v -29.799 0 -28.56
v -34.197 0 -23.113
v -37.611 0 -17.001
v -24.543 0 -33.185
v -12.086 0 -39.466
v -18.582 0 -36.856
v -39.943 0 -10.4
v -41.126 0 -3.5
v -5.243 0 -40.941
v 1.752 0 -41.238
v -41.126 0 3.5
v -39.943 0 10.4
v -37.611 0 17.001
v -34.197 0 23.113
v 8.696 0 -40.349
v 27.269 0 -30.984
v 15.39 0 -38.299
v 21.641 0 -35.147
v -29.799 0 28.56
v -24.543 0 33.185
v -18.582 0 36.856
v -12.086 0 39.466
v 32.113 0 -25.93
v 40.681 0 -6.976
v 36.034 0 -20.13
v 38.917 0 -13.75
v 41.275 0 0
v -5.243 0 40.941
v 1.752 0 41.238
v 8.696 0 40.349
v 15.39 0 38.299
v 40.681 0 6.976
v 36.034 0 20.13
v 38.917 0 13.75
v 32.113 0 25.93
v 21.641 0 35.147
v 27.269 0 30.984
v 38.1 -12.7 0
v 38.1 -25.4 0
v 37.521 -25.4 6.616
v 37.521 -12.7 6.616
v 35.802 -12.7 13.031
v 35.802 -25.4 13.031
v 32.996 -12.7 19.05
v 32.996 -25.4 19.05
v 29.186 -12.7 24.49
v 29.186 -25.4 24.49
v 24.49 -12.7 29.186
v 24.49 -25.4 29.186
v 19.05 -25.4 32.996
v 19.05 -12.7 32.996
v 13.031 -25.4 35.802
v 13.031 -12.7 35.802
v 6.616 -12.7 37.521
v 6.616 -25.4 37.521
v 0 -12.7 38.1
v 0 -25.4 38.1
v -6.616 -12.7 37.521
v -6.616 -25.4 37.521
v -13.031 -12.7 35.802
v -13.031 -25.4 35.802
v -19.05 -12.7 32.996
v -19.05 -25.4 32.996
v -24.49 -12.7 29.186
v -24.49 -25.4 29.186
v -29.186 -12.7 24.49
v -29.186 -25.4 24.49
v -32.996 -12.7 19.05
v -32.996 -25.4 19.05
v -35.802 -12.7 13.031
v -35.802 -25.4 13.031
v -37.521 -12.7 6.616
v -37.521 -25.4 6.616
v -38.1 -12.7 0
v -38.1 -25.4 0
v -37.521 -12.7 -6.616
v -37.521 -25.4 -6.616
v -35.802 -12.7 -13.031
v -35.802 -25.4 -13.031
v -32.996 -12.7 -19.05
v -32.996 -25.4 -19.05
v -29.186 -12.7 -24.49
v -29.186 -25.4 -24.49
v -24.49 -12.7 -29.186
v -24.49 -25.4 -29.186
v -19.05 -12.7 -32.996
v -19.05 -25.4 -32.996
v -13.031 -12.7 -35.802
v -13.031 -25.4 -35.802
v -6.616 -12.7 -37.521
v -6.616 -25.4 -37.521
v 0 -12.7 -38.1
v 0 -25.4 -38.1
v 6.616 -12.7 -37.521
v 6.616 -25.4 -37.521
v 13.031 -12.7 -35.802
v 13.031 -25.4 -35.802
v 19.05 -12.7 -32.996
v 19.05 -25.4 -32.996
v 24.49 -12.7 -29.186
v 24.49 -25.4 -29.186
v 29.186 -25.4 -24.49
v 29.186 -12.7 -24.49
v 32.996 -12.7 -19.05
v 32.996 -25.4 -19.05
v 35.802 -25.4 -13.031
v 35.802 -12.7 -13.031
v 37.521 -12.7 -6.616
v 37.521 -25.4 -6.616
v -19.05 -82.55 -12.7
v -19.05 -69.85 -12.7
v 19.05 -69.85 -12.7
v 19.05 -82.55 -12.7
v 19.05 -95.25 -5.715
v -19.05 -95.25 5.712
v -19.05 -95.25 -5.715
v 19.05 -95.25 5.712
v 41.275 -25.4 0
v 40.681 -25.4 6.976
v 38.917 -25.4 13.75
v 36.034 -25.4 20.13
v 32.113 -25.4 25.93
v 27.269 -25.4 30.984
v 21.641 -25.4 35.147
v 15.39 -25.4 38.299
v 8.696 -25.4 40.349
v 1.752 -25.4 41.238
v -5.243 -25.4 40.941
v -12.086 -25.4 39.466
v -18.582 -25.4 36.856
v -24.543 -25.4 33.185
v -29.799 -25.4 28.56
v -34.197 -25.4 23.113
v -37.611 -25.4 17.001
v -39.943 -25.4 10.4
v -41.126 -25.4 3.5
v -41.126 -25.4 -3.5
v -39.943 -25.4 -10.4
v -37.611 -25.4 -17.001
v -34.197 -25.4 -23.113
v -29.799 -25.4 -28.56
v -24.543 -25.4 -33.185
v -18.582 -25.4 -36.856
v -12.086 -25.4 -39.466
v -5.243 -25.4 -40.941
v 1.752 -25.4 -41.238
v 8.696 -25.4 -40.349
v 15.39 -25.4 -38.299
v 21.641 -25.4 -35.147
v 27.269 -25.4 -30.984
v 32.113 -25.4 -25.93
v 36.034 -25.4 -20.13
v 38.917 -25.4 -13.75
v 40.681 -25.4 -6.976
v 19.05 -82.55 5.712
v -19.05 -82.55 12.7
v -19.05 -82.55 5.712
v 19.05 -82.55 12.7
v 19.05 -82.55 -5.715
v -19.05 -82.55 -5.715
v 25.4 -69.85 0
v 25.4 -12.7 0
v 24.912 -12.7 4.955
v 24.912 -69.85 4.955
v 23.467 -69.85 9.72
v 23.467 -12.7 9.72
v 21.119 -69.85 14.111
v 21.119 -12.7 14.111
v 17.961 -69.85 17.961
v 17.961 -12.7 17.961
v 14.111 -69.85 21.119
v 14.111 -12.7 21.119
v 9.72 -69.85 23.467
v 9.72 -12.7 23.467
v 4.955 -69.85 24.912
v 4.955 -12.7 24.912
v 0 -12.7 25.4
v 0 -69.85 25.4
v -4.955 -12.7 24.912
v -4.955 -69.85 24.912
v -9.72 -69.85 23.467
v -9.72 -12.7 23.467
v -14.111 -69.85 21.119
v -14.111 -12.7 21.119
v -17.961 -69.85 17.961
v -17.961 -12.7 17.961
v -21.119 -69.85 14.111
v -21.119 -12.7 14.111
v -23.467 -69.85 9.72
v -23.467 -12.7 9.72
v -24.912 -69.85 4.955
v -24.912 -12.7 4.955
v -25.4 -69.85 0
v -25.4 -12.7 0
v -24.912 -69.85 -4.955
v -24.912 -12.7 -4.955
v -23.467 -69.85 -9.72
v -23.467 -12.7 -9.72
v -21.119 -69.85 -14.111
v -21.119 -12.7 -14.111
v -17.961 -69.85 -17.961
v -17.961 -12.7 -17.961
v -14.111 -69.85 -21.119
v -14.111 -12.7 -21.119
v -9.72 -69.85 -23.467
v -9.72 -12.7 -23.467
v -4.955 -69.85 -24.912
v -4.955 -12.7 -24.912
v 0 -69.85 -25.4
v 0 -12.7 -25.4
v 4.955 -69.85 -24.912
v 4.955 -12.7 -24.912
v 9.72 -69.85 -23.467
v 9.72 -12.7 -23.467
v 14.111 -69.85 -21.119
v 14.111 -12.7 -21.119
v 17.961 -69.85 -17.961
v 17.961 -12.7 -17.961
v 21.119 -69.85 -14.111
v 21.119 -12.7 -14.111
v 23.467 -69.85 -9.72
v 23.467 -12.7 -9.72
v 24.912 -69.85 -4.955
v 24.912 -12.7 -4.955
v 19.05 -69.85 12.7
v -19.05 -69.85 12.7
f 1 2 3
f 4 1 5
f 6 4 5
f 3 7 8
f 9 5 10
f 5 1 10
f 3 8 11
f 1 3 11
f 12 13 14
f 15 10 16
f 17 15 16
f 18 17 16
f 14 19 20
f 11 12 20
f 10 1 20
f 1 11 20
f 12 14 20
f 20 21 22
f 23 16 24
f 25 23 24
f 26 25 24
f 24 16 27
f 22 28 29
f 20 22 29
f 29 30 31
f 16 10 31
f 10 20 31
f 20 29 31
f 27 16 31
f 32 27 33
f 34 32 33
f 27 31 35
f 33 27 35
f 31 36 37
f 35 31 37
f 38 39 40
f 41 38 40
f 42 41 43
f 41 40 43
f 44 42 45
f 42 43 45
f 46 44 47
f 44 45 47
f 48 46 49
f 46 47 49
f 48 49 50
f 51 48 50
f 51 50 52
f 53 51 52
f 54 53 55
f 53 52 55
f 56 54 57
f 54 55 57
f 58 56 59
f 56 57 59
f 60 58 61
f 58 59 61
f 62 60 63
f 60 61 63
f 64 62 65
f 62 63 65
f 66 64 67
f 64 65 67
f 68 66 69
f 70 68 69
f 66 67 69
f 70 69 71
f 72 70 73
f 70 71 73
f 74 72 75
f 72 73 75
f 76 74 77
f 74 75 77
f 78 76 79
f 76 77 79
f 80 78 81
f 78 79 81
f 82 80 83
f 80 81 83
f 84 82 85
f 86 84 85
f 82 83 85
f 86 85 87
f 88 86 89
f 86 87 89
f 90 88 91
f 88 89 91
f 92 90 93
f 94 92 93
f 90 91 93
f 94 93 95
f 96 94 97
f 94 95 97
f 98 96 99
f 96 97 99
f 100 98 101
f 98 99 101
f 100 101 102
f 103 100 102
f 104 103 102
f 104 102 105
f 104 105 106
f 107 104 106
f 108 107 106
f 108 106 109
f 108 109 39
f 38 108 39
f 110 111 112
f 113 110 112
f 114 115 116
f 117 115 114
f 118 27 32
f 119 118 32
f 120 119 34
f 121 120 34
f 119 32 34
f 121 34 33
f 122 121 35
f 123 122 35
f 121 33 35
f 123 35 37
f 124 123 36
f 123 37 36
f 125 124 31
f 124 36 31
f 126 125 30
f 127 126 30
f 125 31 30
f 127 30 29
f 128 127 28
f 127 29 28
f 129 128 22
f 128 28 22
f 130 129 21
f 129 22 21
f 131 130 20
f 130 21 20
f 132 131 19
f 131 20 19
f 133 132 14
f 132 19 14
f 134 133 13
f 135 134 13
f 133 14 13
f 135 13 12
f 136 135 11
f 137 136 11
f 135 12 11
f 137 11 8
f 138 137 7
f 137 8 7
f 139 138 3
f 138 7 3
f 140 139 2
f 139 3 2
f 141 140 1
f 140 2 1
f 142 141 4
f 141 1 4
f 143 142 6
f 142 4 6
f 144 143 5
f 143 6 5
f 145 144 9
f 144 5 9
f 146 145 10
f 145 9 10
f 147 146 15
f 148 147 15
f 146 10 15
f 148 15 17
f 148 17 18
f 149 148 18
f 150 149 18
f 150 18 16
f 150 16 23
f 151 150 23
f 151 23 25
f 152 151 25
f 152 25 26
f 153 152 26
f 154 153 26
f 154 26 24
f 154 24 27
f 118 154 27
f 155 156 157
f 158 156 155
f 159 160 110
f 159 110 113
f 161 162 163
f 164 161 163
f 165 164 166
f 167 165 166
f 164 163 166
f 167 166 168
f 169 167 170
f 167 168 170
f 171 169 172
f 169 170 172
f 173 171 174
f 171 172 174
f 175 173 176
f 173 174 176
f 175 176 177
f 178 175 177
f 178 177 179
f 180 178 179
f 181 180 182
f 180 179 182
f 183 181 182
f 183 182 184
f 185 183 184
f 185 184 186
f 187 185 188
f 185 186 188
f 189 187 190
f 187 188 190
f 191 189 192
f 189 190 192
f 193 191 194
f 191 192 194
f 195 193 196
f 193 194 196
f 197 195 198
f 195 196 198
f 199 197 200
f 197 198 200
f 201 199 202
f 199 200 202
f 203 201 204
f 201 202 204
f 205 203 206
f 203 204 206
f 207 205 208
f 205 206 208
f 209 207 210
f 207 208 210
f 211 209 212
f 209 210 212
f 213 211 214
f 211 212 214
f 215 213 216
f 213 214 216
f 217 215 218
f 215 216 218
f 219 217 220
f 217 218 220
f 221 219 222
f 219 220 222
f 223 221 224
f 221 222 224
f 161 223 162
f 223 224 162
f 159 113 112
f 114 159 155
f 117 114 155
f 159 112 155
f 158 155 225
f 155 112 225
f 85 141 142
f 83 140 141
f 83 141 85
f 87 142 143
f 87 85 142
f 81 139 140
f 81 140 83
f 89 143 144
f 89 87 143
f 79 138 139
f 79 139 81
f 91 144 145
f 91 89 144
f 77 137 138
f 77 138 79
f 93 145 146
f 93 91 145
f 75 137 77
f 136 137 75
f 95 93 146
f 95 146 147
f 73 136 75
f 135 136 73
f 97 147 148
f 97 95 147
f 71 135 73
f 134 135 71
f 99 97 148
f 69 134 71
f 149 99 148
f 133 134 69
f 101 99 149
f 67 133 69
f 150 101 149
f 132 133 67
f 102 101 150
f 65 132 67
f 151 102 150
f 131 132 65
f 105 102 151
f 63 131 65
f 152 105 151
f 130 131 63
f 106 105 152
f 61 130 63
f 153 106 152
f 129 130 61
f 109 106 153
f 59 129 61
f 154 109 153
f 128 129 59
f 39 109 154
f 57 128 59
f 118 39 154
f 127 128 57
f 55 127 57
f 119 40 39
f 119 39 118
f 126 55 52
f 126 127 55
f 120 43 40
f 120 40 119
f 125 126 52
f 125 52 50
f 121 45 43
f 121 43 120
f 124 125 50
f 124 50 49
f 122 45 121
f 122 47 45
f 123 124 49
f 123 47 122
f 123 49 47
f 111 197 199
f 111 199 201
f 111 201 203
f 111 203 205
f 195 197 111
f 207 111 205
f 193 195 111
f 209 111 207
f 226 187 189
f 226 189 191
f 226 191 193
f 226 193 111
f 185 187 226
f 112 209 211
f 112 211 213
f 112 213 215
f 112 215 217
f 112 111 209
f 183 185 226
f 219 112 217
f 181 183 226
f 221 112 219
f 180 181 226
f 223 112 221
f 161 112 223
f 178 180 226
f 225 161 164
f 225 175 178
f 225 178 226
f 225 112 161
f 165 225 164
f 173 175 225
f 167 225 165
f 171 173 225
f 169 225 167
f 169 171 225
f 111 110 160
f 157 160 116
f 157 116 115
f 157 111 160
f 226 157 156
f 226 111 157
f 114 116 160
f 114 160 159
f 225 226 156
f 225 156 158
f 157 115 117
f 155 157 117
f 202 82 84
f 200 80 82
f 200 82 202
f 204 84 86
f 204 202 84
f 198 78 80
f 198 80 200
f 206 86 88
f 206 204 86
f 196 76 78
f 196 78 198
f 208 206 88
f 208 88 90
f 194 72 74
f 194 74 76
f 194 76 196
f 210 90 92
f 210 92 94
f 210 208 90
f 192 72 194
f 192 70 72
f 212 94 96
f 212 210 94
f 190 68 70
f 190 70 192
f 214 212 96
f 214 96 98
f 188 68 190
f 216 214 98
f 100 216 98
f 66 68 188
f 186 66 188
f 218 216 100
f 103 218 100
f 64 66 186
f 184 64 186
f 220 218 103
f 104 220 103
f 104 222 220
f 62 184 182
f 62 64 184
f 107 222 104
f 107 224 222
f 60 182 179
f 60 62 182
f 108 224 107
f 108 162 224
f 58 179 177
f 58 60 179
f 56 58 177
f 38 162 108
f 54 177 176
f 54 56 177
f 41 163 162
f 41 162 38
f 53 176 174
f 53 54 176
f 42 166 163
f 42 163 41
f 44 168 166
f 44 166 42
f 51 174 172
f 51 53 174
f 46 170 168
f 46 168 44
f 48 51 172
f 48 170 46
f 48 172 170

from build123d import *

# Parameters (mm, degrees)
F0_R     = 41.275
F1_DEPTH = 25.4
F2_R     = 38.1
F3_DEPTH = 12.7
F4_R     = 25.4
F5_DEPTH = 57.15
F6_W     = 38.1
F6_H     = 25.4
F7_DEPTH = 25.4
F8_W     = 38.1
F8_H     = 6.987833
F8_H_2   = 6.985
F9_DEPTH = 12.7


with BuildPart() as f1:
    # F0 (on Front) → F1 (new body)
    with BuildSketch(Plane.XZ):
        Circle(F0_R)
    extrude(amount=F1_DEPTH)

    # F2 (on face) → F3 (cut)
    with BuildSketch(Plane.XZ.offset(25.4)):
        Circle(F2_R)
    extrude(amount=-F3_DEPTH, mode=Mode.SUBTRACT)

    # F4 (on face) → F5 (join)
    with BuildSketch(Plane.XZ.offset(12.7)):
        Circle(F4_R)
    extrude(amount=F5_DEPTH)

    # F6 (on face) → F7 (join)
    with BuildSketch(Plane.XZ.offset(69.85)):
        Rectangle(F6_W, F6_H)
    extrude(amount=F7_DEPTH)

    # F8 (on face) → F9 (cut)
    with BuildSketch(Plane.XZ.offset(95.25)):
        with Locations((0, 9.206084)):
            Rectangle(F8_W, F8_H)
        with Locations((0, -9.2075)):
            Rectangle(F8_W, F8_H_2)
    extrude(amount=-F9_DEPTH, mode=Mode.SUBTRACT)


solid = f1.part
